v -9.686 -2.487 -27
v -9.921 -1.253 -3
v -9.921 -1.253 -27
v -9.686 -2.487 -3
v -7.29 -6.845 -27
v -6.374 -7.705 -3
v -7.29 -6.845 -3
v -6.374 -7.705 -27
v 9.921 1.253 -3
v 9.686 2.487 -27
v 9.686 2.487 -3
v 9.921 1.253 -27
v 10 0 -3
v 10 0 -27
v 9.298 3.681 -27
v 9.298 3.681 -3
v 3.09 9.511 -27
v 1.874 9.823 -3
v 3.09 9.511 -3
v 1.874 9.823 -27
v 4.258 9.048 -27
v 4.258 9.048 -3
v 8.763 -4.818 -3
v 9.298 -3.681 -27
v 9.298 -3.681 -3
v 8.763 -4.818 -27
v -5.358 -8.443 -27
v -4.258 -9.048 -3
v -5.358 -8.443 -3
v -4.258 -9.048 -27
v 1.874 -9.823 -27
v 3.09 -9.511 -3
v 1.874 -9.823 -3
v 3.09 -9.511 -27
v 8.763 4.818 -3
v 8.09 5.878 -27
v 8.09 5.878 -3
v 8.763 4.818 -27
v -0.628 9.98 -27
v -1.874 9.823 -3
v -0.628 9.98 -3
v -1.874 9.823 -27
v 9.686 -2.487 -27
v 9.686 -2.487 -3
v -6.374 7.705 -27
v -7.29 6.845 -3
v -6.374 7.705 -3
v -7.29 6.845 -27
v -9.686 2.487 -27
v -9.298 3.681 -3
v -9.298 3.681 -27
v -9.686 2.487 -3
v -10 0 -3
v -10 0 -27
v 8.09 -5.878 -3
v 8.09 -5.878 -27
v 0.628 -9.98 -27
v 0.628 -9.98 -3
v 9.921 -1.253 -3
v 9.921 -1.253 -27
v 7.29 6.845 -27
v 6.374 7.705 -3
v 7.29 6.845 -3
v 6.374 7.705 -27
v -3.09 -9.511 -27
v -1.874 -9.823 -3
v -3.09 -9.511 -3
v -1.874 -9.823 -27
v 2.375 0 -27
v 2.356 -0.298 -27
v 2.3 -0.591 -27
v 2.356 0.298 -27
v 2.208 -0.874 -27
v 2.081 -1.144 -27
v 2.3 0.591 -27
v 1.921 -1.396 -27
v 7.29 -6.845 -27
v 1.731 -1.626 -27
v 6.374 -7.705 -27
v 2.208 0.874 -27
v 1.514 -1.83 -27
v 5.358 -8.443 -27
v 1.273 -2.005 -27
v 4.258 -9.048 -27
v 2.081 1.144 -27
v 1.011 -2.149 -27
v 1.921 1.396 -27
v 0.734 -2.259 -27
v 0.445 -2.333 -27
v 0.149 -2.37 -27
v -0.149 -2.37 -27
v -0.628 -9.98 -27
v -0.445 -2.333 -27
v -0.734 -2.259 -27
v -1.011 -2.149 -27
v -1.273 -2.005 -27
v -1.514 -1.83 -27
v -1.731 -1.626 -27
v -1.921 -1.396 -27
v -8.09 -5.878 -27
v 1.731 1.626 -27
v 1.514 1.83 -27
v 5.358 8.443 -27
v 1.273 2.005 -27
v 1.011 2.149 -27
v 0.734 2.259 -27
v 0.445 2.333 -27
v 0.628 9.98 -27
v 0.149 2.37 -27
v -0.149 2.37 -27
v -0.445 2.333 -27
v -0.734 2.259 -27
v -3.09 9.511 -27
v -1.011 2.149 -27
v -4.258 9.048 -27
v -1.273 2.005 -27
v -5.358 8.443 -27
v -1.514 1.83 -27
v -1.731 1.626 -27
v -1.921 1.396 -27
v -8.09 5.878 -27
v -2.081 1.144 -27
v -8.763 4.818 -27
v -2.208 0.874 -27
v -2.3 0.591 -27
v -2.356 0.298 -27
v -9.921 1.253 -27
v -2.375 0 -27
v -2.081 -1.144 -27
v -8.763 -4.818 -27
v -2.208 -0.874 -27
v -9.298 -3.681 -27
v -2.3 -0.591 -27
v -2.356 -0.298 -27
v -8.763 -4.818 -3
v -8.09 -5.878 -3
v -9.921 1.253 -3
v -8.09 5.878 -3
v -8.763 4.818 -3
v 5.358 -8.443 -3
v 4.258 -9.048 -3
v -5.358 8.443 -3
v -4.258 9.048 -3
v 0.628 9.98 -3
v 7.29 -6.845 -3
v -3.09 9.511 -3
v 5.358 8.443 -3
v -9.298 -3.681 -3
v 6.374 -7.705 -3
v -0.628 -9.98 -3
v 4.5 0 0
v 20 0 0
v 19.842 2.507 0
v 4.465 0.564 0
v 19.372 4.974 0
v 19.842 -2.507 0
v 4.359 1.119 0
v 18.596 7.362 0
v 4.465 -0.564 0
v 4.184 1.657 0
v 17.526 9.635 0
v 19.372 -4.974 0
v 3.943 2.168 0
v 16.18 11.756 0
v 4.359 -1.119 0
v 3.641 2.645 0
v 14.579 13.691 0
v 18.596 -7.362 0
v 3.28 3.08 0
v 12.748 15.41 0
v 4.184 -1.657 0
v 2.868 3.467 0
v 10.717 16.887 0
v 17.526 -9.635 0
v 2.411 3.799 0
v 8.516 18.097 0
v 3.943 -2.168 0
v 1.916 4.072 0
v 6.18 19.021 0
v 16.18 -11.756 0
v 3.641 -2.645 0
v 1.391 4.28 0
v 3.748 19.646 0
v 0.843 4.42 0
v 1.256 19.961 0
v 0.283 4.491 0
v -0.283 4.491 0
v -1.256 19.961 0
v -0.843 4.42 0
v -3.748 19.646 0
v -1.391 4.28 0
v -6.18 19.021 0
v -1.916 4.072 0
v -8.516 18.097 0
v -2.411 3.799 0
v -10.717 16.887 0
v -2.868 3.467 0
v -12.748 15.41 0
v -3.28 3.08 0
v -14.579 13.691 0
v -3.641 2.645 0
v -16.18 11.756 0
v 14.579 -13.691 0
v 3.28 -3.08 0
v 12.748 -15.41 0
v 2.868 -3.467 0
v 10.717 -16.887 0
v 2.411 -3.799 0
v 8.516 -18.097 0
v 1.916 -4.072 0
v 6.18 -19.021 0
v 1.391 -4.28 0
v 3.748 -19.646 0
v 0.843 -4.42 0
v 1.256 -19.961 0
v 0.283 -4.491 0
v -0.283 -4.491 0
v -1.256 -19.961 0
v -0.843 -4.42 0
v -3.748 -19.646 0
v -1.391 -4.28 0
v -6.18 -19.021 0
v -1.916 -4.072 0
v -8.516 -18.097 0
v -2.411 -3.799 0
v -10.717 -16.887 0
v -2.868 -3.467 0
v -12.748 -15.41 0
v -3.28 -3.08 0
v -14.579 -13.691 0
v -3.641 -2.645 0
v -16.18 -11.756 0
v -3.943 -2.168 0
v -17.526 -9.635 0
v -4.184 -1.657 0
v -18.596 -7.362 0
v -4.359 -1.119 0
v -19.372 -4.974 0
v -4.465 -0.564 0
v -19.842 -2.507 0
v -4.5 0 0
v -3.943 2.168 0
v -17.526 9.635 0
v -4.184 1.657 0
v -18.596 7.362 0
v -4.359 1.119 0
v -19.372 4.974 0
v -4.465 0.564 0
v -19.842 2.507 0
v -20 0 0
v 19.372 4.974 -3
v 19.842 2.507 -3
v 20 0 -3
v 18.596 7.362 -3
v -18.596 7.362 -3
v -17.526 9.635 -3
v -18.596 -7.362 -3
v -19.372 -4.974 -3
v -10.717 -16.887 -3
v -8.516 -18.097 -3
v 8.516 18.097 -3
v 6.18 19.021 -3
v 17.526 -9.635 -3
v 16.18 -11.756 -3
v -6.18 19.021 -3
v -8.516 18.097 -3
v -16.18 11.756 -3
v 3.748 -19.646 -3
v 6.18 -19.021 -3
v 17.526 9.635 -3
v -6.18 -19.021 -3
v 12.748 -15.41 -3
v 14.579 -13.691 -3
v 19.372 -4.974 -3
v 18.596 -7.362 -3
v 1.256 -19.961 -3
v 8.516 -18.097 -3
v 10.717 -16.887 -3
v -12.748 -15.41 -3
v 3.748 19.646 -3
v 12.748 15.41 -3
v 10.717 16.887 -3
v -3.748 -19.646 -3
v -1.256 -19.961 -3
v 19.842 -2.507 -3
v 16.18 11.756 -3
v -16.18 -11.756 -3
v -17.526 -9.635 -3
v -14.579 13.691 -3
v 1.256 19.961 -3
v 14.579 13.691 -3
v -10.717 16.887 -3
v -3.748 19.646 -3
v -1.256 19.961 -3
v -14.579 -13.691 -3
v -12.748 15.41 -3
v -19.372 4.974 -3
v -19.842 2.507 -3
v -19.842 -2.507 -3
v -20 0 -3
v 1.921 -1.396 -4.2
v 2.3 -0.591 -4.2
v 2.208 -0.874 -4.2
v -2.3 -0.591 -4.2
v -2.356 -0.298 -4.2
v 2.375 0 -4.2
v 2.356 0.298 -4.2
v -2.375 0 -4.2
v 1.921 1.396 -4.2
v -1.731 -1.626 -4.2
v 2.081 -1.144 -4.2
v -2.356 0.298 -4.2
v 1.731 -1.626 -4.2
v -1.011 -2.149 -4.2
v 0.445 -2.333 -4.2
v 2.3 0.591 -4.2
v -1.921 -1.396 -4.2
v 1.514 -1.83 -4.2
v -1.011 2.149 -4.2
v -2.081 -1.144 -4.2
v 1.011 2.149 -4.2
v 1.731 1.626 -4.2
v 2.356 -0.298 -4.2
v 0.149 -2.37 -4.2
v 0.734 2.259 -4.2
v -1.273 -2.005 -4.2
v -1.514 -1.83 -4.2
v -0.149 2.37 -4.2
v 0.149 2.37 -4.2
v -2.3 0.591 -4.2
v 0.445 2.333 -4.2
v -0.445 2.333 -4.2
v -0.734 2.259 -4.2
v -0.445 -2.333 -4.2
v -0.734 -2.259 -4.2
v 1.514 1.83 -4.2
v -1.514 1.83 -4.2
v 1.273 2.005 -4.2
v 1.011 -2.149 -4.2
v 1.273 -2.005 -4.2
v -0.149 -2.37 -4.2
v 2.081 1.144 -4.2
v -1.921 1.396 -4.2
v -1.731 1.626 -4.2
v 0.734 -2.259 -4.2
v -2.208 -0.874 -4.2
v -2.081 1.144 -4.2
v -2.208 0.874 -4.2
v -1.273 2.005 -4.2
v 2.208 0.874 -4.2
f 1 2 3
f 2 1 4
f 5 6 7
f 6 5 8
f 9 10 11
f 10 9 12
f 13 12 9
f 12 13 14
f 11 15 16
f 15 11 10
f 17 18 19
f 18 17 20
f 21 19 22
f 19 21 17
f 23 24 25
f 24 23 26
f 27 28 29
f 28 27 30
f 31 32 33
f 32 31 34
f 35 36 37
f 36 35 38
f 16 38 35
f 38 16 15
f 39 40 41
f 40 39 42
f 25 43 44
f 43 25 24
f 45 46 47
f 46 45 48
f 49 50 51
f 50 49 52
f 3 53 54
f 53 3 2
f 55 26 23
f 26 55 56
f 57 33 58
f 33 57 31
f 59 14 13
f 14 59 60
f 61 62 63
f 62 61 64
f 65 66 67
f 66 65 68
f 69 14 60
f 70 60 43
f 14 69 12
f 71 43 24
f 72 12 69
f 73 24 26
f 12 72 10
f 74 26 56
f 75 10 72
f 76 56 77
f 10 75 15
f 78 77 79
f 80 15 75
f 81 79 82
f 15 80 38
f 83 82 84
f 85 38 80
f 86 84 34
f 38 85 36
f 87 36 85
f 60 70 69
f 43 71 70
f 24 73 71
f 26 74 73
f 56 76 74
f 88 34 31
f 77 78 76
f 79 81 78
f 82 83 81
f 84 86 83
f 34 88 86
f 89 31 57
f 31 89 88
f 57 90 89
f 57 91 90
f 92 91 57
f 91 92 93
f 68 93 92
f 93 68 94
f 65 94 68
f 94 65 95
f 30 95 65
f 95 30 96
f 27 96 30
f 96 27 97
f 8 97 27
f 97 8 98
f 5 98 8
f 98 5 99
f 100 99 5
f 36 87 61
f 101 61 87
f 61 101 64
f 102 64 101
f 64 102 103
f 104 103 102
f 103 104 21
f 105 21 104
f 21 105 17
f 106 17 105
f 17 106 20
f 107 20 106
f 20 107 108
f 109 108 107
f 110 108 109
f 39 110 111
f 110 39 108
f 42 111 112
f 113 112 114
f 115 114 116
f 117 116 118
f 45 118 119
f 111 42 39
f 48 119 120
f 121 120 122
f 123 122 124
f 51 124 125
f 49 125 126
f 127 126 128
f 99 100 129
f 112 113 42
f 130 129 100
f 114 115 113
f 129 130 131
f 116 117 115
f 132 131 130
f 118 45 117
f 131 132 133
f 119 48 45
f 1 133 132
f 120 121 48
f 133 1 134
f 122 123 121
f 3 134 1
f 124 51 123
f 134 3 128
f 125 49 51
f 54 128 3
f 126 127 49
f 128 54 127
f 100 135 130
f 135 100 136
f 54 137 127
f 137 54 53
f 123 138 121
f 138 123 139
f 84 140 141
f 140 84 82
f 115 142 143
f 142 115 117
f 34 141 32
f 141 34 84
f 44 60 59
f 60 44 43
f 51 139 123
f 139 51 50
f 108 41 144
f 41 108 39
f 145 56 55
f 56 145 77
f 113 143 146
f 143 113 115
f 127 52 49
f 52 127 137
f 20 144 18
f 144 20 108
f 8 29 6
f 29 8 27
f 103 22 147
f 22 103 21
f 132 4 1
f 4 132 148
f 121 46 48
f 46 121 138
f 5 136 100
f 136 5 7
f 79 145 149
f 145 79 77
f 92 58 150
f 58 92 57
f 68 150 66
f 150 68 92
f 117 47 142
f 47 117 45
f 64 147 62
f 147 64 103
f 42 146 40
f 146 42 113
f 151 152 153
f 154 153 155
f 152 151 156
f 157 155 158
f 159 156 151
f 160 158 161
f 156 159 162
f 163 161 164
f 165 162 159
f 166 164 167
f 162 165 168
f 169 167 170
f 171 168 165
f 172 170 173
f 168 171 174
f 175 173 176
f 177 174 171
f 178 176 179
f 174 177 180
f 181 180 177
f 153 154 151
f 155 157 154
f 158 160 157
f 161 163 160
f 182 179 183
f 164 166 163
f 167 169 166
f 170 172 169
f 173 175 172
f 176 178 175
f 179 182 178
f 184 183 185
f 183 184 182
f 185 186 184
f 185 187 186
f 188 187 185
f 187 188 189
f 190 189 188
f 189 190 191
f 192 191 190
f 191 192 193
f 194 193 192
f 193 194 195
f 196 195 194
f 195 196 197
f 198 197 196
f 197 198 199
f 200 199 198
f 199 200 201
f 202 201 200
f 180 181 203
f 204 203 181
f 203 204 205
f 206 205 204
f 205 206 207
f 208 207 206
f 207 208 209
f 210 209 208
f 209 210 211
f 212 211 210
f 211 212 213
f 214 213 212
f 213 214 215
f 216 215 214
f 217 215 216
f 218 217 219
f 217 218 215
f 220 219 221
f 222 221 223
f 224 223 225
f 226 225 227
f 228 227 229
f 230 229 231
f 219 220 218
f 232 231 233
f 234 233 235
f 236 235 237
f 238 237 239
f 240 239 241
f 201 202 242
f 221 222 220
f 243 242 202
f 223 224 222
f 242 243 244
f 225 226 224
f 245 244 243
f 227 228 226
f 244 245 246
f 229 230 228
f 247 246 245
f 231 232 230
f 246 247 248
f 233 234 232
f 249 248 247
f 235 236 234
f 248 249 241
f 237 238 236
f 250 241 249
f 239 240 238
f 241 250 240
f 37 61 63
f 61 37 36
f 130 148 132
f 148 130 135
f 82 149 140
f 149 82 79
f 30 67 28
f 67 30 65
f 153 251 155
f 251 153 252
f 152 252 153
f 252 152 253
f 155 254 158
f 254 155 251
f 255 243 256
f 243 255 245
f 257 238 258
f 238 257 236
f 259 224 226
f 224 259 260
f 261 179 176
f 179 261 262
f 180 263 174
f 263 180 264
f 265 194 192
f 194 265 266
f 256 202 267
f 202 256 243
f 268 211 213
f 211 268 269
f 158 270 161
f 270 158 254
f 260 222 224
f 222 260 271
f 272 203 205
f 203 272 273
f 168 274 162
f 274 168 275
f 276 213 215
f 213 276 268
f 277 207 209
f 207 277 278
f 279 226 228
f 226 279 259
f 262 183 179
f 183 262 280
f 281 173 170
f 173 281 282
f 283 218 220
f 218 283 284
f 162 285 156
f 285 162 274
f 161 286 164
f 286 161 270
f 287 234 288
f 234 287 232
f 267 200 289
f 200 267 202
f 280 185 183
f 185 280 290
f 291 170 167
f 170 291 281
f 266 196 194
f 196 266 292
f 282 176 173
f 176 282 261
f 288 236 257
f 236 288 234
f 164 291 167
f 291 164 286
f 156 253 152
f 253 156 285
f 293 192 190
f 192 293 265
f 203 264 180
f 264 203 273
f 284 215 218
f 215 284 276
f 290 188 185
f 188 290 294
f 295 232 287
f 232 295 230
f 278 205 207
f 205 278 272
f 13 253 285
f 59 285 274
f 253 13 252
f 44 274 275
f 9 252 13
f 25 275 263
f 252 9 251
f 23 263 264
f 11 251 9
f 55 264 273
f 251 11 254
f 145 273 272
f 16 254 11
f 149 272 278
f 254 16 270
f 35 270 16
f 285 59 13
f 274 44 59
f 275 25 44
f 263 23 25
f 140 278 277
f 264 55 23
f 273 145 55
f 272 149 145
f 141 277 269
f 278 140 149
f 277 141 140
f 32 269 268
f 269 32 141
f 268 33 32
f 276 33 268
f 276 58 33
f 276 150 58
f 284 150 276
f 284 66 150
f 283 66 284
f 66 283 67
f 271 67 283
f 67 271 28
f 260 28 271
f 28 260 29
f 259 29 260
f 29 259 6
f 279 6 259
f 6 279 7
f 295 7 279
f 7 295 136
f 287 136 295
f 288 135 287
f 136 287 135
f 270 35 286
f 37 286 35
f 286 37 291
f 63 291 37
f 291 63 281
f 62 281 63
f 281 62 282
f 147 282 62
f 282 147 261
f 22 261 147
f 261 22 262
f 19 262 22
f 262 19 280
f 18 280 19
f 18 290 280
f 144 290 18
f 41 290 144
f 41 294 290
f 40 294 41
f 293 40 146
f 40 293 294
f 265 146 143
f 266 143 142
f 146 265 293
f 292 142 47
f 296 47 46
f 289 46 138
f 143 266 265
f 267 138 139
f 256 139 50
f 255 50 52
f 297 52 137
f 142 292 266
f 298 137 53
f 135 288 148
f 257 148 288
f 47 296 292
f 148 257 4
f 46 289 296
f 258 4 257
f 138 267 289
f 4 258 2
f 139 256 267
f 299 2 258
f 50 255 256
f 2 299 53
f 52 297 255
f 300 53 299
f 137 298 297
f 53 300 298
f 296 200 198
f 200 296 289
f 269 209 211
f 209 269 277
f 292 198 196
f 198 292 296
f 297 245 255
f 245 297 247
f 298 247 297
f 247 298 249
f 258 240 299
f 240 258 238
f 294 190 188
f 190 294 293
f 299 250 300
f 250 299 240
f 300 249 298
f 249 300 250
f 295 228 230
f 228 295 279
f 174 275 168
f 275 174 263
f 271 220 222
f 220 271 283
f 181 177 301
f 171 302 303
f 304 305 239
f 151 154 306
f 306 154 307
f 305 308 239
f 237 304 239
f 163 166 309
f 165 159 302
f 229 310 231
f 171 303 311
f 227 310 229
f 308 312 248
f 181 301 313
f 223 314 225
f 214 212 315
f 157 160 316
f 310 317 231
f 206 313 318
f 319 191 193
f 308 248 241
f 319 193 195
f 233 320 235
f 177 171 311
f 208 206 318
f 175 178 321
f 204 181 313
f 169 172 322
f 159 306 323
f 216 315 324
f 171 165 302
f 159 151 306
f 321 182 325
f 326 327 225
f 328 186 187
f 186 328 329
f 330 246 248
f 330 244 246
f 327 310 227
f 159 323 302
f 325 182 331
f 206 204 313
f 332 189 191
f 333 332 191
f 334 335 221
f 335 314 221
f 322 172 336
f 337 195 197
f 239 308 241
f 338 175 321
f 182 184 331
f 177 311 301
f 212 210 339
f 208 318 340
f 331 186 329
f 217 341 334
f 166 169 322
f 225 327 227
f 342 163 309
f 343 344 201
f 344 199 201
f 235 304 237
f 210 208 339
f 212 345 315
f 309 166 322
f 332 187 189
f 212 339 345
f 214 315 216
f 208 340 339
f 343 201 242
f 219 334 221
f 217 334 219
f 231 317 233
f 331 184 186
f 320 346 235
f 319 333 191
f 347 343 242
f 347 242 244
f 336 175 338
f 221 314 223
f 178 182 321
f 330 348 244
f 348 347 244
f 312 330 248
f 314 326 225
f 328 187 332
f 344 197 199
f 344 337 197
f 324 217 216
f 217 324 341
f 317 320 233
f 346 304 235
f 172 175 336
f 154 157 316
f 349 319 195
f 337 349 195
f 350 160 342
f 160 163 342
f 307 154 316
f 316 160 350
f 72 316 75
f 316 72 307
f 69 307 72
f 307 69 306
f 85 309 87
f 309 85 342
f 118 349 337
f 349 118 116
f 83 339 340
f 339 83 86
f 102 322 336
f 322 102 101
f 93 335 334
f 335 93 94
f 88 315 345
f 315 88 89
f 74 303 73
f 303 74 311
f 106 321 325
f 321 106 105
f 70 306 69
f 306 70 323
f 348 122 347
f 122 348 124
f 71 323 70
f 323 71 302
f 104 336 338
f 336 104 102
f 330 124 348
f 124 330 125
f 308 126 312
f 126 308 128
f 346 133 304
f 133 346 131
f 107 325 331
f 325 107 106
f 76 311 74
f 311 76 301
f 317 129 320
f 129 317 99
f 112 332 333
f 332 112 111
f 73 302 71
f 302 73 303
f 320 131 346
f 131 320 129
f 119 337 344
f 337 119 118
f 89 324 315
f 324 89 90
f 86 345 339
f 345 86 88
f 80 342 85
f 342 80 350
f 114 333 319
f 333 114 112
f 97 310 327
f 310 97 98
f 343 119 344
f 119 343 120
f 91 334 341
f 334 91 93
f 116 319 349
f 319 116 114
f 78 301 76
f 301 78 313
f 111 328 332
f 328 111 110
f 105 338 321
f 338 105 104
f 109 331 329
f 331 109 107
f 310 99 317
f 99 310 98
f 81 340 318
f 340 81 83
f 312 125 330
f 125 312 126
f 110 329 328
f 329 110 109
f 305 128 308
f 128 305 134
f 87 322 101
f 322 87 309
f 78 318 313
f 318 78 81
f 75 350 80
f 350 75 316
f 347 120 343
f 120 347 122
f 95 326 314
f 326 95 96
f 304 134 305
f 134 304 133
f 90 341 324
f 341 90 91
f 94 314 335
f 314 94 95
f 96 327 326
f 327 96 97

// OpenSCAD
$fn = 50;


difference() {
	union() {
		translate(v = [0, 0, -27.0000000000]) {
			cylinder(h = 27, r = 10.0000000000);
		}
		translate(v = [0, 0, -3.0000000000]) {
			cylinder(h = 3, r = 20.0000000000);
		}
	}
	union() {
		translate(v = [0, 0, 0]) {
			rotate(a = [0, 0, 0]) {
				difference() {
					union() {
						#translate(v = [0, 0, -27.0000000000]) {
							cylinder(h = 27, r = 2.2500000000);
						}
						#translate(v = [0, 0, -4.2000000000]) {
							cylinder(h = 4.2000000000, r = 10.0000000000, r1 = 2.3750000000, r2 = 4.5000000000);
						}
						#translate(v = [0, 0, -27.0000000000]) {
							cylinder(h = 27, r = 2.3750000000);
						}
						#translate(v = [0, 0, -27.0000000000]) {
							cylinder(h = 27, r = 2.2500000000);
						}
					}
					union();
				}
			}
		}
	}
}
